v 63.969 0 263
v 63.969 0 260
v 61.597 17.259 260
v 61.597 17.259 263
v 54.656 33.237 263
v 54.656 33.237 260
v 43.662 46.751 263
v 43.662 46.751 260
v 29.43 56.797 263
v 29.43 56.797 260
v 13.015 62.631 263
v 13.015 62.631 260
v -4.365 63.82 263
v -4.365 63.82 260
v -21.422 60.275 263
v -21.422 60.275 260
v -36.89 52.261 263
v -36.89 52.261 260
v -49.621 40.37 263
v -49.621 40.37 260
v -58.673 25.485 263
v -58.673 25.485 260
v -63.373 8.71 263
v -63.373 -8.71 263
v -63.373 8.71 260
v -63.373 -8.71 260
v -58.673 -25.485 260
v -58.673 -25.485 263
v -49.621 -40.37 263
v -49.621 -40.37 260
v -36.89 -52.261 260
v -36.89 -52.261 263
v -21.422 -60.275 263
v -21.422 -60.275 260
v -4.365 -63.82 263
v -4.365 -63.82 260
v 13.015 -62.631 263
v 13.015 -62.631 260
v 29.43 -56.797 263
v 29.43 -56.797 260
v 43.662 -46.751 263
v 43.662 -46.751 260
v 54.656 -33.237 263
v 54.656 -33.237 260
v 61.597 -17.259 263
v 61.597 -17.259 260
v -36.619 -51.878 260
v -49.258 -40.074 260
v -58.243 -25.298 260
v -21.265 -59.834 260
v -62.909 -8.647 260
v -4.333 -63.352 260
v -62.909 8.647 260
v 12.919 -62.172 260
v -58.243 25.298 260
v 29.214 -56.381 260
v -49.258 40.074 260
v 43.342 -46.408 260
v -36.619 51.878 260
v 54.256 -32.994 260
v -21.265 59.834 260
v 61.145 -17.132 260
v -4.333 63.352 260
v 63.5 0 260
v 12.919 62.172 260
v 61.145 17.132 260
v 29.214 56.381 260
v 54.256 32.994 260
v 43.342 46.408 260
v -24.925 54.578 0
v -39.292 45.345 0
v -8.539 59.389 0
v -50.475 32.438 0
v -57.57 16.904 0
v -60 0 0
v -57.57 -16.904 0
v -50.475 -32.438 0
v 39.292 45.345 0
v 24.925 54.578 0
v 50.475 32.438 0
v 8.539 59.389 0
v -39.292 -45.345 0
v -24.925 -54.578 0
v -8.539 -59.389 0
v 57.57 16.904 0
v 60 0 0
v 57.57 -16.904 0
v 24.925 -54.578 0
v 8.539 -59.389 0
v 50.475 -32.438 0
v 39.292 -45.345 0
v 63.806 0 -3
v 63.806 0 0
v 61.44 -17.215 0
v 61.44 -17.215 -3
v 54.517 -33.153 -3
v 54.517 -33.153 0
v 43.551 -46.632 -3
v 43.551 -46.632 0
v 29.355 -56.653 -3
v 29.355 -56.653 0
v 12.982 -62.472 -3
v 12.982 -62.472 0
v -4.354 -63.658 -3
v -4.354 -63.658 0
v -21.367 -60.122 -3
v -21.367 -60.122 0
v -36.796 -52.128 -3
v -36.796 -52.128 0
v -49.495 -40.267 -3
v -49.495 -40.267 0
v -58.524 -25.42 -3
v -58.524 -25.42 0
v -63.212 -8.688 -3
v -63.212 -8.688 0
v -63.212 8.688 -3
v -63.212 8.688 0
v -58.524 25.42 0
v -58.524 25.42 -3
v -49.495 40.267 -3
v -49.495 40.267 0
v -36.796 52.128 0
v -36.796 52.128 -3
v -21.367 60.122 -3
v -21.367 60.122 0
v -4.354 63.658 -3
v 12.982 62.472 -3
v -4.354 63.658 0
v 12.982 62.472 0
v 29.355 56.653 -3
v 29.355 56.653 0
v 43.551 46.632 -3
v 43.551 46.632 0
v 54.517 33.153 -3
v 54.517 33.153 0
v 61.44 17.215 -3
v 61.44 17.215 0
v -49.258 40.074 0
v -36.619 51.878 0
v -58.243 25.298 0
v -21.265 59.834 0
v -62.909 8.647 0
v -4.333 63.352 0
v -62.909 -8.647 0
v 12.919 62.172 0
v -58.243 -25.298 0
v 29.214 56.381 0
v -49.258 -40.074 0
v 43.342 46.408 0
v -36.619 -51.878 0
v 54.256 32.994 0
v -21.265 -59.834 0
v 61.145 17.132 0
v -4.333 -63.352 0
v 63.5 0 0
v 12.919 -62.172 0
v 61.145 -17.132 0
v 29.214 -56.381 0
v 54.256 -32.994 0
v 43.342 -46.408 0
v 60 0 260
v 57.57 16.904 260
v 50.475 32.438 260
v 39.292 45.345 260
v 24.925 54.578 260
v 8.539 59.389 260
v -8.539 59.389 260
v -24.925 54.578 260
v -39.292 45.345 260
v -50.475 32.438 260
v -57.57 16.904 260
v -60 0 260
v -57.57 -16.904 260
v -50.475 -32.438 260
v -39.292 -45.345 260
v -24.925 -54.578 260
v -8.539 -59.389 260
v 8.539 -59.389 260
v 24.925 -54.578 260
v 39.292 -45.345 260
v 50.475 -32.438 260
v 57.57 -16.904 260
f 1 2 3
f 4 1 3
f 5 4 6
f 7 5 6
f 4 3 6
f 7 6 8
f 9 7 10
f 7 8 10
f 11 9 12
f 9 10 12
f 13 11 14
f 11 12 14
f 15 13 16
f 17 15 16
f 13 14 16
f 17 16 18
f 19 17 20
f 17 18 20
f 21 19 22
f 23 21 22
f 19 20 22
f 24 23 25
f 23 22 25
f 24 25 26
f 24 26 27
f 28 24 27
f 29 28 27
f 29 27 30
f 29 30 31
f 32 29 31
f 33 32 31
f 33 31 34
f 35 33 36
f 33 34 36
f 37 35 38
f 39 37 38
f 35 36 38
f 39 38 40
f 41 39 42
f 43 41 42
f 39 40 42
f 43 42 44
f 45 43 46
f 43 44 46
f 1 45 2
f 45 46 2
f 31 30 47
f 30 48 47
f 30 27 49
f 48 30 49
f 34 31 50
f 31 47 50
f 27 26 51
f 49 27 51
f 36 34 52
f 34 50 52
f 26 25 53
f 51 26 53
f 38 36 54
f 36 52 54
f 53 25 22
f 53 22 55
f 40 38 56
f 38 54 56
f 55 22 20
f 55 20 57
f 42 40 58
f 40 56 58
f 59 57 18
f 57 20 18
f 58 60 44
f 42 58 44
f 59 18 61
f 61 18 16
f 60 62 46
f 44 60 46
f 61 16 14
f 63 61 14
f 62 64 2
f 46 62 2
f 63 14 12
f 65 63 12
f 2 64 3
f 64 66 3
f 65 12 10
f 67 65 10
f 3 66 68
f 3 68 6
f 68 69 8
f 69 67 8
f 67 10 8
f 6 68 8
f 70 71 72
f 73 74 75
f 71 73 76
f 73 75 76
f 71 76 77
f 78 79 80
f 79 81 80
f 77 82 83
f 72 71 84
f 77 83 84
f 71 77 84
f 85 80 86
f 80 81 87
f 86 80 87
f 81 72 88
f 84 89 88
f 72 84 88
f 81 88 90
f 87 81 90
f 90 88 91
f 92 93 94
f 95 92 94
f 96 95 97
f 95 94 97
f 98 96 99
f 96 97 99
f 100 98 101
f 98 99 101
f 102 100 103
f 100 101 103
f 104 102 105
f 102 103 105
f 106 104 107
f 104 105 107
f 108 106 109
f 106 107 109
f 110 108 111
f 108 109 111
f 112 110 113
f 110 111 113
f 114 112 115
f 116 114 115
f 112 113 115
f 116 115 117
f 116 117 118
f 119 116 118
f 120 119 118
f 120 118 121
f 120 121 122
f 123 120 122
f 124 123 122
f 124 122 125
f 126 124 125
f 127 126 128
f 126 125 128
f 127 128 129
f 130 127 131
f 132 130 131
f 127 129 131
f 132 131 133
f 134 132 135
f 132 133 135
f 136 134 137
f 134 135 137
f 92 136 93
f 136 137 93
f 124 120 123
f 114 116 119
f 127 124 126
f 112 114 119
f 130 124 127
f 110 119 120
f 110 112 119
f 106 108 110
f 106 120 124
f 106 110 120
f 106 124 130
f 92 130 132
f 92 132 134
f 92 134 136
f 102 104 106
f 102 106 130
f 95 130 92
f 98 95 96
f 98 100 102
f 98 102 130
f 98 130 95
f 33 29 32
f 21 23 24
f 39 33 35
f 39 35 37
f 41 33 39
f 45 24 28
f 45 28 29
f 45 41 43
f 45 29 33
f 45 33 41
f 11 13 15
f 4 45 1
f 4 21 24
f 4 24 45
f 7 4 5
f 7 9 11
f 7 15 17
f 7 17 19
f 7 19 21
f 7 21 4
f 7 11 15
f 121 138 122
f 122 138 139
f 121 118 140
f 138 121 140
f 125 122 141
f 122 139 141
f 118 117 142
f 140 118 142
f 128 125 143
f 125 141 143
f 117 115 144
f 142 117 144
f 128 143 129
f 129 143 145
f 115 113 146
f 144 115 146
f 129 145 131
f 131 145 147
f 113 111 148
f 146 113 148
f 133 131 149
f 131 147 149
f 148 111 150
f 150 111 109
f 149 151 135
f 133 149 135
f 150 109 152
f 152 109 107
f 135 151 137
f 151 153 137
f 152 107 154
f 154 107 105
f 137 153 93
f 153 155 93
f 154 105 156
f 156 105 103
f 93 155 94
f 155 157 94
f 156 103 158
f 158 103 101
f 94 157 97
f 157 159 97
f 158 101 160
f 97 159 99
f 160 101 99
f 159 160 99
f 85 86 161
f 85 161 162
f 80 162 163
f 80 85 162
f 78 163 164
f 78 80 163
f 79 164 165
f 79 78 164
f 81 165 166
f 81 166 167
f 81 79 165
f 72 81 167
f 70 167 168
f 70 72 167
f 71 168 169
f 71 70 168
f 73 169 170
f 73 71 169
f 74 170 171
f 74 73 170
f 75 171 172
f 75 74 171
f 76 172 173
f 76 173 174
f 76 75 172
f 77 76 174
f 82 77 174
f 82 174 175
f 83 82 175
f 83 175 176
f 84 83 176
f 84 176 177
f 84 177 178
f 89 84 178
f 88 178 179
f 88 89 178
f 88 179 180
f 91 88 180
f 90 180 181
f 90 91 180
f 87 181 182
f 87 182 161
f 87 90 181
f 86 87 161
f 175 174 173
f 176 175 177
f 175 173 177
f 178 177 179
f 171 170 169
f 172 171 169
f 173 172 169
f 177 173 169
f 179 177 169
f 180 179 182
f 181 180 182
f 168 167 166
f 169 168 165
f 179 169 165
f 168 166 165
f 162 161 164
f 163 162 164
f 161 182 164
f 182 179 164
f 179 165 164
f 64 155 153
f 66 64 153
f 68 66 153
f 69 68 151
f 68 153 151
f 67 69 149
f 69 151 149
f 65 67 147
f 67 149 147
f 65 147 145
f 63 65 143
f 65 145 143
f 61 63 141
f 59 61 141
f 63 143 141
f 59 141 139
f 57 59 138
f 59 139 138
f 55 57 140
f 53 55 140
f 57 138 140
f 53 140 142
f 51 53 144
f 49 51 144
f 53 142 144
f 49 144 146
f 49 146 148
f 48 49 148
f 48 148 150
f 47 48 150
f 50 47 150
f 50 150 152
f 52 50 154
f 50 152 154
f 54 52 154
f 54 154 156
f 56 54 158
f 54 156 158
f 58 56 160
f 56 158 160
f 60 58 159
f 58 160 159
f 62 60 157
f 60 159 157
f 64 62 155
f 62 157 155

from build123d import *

# Parameters (mm, degrees)
F0_R     = 63.5
F0_R_2   = 60
F1_DEPTH = 260
F2_R     = 63.806252
F3_DEPTH = 3
F4_R     = 63.968913
F5_DEPTH = 3


with BuildPart() as f1:
    # F0 (on Top) → F1 (new body)
    with BuildSketch(Plane.XY):
        Circle(F0_R)
        Circle(F0_R_2, mode=Mode.SUBTRACT)
    extrude(amount=F1_DEPTH)

    # F2 (on face) → F3 (join)
    with BuildSketch(Plane(origin=(0, 0, 0), x_dir=(1, 0, 0), z_dir=(0, 0, -1))):
        Circle(F2_R)
    extrude(amount=F3_DEPTH)

    # F4 (on face) → F5 (join)
    with BuildSketch(Plane.XY.offset(260)):
        Circle(F4_R)
    extrude(amount=F5_DEPTH)


solid = f1.part
